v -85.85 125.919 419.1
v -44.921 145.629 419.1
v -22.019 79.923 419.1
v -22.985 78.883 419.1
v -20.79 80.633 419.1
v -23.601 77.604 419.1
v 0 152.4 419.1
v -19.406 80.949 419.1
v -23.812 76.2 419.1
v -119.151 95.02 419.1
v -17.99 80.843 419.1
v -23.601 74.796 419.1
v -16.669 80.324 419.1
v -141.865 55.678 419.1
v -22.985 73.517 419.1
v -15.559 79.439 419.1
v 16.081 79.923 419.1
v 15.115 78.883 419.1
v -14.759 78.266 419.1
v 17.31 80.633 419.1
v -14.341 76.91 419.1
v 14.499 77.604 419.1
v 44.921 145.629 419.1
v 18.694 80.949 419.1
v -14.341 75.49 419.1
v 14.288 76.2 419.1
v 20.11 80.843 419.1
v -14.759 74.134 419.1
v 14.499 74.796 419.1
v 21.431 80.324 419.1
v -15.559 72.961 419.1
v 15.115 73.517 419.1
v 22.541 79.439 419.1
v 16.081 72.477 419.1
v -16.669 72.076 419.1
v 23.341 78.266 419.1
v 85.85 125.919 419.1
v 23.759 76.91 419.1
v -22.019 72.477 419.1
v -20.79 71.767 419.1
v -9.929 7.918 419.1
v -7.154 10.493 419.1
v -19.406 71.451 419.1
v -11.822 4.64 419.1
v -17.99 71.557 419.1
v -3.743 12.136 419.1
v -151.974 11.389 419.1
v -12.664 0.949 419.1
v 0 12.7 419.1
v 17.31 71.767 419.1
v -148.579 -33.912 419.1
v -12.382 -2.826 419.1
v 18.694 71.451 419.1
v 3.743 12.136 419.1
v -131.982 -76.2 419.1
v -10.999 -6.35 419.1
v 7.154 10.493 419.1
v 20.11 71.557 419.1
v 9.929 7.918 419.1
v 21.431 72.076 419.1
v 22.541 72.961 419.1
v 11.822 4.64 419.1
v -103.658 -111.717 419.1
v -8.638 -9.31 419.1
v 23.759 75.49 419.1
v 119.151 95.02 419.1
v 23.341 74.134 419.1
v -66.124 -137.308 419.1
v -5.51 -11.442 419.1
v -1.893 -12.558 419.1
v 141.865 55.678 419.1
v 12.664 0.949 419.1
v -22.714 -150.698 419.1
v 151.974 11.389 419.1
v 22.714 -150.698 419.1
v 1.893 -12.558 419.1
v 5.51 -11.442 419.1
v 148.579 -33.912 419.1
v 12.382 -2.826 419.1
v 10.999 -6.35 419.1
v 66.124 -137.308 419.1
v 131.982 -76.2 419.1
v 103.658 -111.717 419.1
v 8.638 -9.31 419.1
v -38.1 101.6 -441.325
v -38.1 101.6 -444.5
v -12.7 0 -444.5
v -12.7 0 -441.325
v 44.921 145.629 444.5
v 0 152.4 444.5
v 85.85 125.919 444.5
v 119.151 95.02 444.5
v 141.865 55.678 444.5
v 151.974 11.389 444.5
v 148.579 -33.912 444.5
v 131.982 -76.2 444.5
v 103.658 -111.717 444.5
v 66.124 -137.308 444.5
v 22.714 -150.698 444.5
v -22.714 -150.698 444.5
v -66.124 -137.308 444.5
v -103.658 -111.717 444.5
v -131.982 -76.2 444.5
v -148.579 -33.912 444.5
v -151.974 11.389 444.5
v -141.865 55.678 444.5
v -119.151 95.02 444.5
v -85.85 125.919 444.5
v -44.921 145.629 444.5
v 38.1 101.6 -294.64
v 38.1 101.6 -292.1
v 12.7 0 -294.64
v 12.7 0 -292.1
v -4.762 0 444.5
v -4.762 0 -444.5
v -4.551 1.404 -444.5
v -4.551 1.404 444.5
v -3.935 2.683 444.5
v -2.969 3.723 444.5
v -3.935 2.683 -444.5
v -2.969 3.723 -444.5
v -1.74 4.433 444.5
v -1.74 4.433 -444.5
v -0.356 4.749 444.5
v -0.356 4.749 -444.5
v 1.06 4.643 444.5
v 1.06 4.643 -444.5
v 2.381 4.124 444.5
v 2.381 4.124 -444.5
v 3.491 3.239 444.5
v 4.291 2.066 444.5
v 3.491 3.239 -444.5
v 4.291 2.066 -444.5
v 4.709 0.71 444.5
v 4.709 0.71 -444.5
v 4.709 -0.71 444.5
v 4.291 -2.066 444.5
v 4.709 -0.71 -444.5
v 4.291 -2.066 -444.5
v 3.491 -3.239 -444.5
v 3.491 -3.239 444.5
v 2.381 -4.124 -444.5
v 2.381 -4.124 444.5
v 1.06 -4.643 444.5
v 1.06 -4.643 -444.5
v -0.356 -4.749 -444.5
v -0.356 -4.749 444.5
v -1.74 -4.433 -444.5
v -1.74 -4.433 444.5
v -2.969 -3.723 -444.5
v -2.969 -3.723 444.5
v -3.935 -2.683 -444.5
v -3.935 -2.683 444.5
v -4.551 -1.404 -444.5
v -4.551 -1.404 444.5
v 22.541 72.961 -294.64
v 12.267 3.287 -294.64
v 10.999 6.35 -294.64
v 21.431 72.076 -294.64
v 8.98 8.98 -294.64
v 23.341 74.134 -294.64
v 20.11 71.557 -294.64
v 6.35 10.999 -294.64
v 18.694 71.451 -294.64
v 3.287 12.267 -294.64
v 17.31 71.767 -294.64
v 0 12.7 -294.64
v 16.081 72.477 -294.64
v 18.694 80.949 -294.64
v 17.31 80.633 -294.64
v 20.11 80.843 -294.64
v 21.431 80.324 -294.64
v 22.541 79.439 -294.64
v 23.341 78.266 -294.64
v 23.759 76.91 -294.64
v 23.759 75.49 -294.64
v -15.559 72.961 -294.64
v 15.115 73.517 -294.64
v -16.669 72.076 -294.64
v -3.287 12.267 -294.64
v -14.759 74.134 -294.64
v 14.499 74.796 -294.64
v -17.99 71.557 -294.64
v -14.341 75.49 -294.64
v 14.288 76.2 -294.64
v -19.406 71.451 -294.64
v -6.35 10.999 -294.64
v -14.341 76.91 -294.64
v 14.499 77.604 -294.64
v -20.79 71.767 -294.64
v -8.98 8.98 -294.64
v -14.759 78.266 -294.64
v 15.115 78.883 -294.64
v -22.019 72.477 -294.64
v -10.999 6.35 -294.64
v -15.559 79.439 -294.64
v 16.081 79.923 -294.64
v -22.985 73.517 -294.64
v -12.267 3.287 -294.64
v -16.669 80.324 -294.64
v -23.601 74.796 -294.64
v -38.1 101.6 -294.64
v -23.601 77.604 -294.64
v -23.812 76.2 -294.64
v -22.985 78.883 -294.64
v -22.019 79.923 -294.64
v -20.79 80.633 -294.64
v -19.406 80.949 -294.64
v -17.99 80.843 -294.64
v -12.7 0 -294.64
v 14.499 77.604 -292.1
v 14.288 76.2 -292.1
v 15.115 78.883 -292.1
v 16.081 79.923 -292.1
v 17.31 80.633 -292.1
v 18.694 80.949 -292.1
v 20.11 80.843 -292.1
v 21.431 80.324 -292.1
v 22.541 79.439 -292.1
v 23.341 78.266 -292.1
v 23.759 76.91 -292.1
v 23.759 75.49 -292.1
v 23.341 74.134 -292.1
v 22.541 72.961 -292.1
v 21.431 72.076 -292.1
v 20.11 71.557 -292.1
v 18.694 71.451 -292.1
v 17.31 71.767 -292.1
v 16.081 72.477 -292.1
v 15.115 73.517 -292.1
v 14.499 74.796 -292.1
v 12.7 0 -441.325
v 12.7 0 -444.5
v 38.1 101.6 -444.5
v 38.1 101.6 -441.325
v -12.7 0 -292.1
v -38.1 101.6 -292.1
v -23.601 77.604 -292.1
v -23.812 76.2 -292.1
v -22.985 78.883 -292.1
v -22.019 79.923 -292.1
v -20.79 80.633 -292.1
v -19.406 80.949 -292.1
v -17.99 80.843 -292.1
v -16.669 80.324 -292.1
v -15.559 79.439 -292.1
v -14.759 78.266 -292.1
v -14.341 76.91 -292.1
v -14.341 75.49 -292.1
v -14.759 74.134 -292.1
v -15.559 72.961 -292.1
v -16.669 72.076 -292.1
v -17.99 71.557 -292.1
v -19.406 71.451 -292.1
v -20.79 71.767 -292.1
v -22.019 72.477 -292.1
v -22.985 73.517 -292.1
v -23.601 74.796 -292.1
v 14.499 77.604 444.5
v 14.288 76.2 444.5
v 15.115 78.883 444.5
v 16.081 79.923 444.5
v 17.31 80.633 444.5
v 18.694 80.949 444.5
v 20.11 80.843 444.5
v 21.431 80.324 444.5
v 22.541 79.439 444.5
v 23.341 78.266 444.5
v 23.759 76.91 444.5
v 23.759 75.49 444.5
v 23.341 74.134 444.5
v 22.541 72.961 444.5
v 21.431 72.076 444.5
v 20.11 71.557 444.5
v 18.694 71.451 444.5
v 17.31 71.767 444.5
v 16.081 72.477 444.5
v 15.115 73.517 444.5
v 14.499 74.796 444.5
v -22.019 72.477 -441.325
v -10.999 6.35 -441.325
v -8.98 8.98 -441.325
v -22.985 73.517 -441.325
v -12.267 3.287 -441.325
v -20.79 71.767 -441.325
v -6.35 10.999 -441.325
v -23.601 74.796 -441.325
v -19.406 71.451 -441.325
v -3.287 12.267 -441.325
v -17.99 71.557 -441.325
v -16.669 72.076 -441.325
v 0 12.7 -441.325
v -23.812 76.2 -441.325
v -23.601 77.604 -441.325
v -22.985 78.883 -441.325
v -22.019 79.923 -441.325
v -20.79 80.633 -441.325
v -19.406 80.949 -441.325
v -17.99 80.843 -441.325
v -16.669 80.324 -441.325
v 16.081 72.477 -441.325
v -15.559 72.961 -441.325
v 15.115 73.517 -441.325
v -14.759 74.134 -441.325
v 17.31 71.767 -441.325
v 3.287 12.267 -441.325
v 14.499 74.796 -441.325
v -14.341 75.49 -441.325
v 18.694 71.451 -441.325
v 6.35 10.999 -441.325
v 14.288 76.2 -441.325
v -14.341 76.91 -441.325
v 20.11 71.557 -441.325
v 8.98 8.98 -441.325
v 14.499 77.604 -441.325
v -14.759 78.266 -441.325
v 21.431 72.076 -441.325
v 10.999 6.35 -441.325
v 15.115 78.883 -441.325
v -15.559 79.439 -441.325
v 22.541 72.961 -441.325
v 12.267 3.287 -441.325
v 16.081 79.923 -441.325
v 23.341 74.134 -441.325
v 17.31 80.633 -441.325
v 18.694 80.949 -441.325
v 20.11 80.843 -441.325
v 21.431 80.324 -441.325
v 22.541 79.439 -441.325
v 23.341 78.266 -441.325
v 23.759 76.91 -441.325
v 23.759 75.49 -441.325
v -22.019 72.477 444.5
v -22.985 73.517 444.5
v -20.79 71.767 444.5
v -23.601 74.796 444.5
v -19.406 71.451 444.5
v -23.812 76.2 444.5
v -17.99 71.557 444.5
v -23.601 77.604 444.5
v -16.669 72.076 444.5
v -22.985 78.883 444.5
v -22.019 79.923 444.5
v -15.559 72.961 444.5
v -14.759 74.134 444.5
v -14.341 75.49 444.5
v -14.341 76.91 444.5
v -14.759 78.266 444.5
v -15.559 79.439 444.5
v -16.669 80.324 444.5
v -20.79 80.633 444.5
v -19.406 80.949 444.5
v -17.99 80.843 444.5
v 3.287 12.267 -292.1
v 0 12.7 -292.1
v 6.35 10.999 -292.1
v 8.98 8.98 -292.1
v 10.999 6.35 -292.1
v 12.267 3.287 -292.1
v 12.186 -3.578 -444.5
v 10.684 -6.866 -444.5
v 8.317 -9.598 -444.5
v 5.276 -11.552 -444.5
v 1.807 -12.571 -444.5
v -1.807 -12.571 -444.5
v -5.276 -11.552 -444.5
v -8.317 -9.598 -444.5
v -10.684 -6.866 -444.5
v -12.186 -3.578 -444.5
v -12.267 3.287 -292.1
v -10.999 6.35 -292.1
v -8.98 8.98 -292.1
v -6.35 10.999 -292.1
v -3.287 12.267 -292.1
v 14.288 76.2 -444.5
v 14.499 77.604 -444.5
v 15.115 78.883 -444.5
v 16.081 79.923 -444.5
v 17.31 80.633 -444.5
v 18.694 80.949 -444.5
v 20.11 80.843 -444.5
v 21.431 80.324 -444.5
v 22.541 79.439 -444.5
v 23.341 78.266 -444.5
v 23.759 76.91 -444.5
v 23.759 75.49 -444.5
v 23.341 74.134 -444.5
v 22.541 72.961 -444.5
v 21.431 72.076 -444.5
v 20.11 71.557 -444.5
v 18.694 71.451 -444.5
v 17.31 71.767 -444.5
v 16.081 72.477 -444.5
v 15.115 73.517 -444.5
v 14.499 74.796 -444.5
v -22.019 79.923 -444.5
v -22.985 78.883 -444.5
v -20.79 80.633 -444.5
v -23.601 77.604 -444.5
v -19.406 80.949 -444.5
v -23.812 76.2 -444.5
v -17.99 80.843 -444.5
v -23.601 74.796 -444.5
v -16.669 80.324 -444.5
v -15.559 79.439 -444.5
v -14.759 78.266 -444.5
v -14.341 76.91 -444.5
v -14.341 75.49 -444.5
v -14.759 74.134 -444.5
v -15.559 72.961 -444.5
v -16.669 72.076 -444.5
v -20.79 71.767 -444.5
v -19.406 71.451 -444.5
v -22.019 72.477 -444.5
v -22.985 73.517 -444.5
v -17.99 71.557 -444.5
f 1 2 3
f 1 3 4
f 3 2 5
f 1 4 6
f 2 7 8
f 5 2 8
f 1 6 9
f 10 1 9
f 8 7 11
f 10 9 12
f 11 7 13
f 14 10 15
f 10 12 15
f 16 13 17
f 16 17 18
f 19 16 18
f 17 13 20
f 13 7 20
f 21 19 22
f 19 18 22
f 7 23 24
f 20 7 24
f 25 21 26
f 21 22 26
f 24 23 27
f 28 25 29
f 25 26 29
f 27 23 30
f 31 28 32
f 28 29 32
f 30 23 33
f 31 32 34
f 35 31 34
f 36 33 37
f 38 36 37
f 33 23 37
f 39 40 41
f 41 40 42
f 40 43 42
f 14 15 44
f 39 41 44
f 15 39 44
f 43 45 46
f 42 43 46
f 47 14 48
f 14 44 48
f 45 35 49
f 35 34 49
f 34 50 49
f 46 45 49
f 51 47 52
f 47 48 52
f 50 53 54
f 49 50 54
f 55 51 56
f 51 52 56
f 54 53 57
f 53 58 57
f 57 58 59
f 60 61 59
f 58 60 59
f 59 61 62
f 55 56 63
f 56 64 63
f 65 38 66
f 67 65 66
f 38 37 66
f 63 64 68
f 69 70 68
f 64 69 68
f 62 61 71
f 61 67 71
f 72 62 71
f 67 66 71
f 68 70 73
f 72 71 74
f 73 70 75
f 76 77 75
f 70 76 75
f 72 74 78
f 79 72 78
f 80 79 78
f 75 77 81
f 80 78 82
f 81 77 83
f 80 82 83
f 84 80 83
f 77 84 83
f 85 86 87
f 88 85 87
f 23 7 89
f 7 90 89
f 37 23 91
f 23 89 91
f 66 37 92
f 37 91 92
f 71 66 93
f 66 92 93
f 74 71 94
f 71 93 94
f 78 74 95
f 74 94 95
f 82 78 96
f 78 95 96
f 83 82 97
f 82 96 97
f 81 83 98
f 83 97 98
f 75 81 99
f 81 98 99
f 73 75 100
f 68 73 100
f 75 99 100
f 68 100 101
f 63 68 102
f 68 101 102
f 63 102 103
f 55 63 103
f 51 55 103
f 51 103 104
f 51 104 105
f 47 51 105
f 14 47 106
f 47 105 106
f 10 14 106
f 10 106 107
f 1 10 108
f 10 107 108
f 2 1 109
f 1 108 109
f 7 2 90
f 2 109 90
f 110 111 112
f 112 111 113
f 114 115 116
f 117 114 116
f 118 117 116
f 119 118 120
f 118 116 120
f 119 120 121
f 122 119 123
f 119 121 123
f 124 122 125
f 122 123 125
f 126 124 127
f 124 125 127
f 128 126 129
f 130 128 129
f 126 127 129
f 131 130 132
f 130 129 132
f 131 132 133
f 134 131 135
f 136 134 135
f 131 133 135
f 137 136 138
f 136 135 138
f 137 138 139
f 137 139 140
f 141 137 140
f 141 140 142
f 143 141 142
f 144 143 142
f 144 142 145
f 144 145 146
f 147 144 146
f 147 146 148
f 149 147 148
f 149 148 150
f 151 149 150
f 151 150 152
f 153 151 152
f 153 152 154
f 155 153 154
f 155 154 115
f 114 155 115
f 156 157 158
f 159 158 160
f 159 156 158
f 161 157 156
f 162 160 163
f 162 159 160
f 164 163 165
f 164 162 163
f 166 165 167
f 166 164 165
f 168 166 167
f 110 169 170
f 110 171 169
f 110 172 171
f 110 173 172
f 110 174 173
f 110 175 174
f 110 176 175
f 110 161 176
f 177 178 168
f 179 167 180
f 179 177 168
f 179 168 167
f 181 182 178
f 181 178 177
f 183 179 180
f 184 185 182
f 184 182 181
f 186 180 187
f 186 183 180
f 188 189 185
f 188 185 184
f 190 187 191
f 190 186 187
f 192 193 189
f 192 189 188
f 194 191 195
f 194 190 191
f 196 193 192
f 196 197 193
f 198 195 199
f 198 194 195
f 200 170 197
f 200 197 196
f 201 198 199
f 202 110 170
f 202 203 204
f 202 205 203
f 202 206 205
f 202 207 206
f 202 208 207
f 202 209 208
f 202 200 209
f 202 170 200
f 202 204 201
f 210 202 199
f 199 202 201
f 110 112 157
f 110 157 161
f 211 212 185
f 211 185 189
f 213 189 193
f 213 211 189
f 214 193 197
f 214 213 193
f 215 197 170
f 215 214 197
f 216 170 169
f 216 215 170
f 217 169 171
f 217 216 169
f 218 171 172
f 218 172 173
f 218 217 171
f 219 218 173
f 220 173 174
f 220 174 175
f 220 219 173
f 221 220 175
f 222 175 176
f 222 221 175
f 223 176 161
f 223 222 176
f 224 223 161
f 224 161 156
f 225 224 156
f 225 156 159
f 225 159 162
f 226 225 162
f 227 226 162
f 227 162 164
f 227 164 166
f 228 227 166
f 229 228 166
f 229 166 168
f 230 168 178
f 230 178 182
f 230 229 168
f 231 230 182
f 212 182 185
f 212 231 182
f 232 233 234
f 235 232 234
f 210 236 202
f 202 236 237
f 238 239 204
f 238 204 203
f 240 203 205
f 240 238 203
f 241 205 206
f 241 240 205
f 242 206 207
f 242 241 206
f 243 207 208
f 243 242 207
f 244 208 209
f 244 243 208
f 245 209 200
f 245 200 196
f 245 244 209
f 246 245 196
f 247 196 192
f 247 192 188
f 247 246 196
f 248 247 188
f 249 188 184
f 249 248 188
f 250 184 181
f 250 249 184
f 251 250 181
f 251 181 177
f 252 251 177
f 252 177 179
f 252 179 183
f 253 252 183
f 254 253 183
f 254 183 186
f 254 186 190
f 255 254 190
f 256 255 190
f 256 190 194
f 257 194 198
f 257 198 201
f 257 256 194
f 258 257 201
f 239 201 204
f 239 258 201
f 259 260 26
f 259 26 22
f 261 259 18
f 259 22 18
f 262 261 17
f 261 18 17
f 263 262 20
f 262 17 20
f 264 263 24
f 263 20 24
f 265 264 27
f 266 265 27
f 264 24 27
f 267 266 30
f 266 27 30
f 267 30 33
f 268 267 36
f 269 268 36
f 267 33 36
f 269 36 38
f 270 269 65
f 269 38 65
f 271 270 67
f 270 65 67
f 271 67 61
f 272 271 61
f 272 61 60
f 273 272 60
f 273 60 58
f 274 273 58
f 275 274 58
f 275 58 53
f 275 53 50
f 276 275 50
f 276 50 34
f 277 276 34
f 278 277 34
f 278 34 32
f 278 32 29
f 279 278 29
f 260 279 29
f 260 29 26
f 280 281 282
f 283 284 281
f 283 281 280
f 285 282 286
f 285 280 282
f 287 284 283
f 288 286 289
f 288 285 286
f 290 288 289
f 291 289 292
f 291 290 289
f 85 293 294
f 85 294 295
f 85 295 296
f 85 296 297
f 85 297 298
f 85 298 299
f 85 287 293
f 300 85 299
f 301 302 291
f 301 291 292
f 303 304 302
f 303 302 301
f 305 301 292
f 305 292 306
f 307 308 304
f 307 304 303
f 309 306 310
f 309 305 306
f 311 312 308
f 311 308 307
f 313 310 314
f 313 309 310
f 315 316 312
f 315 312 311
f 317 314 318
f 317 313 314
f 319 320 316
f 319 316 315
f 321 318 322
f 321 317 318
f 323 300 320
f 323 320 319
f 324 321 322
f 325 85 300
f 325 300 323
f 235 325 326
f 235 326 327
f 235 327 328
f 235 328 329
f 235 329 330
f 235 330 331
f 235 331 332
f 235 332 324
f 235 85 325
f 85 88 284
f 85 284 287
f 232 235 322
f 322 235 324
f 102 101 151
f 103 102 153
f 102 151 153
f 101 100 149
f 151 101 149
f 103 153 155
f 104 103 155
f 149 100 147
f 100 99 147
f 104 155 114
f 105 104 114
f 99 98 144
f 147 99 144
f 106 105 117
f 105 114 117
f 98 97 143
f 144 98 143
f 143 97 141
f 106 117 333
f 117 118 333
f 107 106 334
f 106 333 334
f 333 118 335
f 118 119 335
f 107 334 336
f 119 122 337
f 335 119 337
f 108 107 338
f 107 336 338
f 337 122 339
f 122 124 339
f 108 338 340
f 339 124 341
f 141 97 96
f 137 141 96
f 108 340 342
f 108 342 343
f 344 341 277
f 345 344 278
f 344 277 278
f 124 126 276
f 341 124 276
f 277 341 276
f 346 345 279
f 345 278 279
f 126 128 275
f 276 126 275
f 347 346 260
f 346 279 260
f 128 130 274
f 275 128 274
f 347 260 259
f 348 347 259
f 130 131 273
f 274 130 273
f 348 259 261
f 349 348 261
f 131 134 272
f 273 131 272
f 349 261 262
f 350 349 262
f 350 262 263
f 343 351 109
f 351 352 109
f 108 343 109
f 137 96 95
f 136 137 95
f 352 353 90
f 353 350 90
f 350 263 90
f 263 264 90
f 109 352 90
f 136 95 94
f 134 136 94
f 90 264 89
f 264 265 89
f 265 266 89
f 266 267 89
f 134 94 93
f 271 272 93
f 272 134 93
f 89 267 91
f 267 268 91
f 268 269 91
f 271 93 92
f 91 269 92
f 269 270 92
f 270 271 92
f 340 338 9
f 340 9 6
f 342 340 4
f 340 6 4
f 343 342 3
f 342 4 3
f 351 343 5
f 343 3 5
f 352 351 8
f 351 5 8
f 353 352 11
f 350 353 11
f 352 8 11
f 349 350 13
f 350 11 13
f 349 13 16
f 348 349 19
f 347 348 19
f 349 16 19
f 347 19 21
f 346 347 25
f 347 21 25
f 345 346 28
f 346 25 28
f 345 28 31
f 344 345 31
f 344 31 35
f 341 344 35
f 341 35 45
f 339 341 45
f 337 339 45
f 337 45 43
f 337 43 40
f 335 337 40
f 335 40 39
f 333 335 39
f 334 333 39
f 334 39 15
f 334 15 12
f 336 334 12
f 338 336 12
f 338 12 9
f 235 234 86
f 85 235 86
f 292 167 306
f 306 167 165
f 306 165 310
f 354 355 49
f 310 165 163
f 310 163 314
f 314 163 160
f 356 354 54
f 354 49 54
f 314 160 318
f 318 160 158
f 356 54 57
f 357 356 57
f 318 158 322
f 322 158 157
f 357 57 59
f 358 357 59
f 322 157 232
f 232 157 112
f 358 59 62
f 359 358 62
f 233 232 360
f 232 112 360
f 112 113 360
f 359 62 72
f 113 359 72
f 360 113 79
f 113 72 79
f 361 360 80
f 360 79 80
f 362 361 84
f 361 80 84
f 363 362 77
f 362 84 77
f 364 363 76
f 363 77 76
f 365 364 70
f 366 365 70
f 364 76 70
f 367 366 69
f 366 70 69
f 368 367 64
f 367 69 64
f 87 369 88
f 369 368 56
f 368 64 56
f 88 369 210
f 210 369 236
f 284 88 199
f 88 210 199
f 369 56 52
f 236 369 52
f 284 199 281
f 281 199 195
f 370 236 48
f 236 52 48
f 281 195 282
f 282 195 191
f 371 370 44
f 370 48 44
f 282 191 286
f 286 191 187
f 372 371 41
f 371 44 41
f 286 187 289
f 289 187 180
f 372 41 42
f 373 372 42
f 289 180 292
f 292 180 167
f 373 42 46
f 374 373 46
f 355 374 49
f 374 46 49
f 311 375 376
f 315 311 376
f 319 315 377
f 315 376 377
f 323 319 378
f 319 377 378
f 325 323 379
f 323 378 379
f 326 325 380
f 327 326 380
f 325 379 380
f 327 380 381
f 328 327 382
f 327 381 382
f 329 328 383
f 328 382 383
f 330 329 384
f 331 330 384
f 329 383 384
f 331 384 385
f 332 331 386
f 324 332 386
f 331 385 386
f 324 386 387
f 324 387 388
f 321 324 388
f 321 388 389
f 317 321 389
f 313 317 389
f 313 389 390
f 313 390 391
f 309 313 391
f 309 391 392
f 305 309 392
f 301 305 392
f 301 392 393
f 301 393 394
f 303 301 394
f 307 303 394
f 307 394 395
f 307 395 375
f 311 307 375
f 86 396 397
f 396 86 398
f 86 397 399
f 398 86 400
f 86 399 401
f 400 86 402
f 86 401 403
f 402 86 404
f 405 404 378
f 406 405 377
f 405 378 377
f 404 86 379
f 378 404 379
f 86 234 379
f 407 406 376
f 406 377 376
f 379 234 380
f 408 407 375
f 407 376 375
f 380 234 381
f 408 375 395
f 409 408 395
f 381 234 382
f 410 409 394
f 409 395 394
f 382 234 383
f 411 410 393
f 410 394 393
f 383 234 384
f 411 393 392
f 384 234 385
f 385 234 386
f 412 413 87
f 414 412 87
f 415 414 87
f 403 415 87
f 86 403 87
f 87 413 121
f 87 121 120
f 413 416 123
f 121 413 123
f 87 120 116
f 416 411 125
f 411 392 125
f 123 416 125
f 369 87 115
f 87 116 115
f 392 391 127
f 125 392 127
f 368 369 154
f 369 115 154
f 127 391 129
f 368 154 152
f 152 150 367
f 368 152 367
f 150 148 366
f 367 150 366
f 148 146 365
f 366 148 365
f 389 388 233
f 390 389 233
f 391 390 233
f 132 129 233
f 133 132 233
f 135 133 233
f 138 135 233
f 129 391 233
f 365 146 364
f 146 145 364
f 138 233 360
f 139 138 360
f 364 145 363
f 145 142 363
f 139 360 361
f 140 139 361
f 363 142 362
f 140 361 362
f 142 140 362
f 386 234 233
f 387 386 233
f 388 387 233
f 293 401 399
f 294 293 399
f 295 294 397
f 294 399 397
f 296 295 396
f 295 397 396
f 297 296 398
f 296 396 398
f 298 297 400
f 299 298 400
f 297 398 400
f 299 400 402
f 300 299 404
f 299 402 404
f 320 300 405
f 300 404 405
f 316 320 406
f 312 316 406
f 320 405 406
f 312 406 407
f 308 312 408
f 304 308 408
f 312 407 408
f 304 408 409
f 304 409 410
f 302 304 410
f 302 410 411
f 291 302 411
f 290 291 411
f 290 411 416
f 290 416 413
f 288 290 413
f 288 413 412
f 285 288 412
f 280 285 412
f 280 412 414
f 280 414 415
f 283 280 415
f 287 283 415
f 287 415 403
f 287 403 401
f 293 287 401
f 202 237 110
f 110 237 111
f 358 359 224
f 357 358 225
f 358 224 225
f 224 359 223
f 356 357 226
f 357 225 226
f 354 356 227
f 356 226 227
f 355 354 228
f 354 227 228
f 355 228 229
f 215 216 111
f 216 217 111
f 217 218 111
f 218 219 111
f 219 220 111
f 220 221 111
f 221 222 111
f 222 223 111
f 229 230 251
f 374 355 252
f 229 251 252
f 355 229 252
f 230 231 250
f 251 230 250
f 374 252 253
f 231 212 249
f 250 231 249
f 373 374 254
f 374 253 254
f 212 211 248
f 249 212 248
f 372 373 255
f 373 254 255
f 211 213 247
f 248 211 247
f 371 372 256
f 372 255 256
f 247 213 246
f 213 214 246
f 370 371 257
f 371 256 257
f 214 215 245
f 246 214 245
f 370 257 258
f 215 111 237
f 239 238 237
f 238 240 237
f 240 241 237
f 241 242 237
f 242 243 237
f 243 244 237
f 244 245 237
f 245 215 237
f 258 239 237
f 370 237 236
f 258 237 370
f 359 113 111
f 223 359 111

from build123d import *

# Parameters (mm, degrees)
END_TAB_1_DEPTH     = 3.175
SKETCH4_R           = 4.7625
END_TAB_1_CUT_DEPTH = 890
SKETCH5_R           = 4.7625
BOSS_EXTRUDE1_DEPTH = 2.54


with BuildPart() as part:
    # Sketch1 → OAL Revolve (revolve)
    with BuildSketch(Plane(origin=(0, 0, 0), x_dir=(0, 0, -1), z_dir=(1, 0, 0))):
        Polygon((-444.5, 0), (444.5, 0), (444.5, 12.7), (-419.1, 12.7), (-419.1, 152.4), (-444.5, 152.4), align=None)
    revolve(axis=Axis((0, 0, 444.5), (0, 0, -1)))

    # Sketch3 → End Tab 1 (add)
    with BuildSketch(Plane(origin=(0, 0, -444.5), x_dir=(-1, 0, 0), z_dir=(0, 0, -1))):
        Polygon((12.7, 0), (-12.7, 0), (-38.1, 101.6), (38.1, 101.6), align=None)
    extrude(amount=-END_TAB_1_DEPTH)

    # Sketch4 → End Tab 1 Cut (cut, through all)
    with BuildSketch(Plane(origin=(0, 0, -444.5), x_dir=(-1, 0, 0), z_dir=(0, 0, -1))):
        with Locations((-19.05, 76.2)):
            Circle(SKETCH4_R)
        with Locations((19.05, 76.2)):
            Circle(SKETCH4_R)
        Circle(SKETCH4_R)
    extrude(amount=-END_TAB_1_CUT_DEPTH, mode=Mode.SUBTRACT)

    # Sketch5 → Boss-Extrude1 (add)
    with BuildSketch(Plane(origin=(0, 0, -292.1), x_dir=(-1, 0, 0), z_dir=(0, 0, -1))):
        with BuildLine():
            Line((12.7, 0), (38.1, 101.6))
            Line((38.1, 101.6), (-38.1, 101.6))
            Line((-38.1, 101.6), (-12.7, 0))
            ThreePointArc((-12.7, 0), (0, 12.7), (12.7, 0))
        make_face()
        with Locations((19.05, 76.2)):
            Circle(SKETCH5_R, mode=Mode.SUBTRACT)
        with Locations((-19.05, 76.2)):
            Circle(SKETCH5_R, mode=Mode.SUBTRACT)
    extrude(amount=BOSS_EXTRUDE1_DEPTH)


solid = part.part
